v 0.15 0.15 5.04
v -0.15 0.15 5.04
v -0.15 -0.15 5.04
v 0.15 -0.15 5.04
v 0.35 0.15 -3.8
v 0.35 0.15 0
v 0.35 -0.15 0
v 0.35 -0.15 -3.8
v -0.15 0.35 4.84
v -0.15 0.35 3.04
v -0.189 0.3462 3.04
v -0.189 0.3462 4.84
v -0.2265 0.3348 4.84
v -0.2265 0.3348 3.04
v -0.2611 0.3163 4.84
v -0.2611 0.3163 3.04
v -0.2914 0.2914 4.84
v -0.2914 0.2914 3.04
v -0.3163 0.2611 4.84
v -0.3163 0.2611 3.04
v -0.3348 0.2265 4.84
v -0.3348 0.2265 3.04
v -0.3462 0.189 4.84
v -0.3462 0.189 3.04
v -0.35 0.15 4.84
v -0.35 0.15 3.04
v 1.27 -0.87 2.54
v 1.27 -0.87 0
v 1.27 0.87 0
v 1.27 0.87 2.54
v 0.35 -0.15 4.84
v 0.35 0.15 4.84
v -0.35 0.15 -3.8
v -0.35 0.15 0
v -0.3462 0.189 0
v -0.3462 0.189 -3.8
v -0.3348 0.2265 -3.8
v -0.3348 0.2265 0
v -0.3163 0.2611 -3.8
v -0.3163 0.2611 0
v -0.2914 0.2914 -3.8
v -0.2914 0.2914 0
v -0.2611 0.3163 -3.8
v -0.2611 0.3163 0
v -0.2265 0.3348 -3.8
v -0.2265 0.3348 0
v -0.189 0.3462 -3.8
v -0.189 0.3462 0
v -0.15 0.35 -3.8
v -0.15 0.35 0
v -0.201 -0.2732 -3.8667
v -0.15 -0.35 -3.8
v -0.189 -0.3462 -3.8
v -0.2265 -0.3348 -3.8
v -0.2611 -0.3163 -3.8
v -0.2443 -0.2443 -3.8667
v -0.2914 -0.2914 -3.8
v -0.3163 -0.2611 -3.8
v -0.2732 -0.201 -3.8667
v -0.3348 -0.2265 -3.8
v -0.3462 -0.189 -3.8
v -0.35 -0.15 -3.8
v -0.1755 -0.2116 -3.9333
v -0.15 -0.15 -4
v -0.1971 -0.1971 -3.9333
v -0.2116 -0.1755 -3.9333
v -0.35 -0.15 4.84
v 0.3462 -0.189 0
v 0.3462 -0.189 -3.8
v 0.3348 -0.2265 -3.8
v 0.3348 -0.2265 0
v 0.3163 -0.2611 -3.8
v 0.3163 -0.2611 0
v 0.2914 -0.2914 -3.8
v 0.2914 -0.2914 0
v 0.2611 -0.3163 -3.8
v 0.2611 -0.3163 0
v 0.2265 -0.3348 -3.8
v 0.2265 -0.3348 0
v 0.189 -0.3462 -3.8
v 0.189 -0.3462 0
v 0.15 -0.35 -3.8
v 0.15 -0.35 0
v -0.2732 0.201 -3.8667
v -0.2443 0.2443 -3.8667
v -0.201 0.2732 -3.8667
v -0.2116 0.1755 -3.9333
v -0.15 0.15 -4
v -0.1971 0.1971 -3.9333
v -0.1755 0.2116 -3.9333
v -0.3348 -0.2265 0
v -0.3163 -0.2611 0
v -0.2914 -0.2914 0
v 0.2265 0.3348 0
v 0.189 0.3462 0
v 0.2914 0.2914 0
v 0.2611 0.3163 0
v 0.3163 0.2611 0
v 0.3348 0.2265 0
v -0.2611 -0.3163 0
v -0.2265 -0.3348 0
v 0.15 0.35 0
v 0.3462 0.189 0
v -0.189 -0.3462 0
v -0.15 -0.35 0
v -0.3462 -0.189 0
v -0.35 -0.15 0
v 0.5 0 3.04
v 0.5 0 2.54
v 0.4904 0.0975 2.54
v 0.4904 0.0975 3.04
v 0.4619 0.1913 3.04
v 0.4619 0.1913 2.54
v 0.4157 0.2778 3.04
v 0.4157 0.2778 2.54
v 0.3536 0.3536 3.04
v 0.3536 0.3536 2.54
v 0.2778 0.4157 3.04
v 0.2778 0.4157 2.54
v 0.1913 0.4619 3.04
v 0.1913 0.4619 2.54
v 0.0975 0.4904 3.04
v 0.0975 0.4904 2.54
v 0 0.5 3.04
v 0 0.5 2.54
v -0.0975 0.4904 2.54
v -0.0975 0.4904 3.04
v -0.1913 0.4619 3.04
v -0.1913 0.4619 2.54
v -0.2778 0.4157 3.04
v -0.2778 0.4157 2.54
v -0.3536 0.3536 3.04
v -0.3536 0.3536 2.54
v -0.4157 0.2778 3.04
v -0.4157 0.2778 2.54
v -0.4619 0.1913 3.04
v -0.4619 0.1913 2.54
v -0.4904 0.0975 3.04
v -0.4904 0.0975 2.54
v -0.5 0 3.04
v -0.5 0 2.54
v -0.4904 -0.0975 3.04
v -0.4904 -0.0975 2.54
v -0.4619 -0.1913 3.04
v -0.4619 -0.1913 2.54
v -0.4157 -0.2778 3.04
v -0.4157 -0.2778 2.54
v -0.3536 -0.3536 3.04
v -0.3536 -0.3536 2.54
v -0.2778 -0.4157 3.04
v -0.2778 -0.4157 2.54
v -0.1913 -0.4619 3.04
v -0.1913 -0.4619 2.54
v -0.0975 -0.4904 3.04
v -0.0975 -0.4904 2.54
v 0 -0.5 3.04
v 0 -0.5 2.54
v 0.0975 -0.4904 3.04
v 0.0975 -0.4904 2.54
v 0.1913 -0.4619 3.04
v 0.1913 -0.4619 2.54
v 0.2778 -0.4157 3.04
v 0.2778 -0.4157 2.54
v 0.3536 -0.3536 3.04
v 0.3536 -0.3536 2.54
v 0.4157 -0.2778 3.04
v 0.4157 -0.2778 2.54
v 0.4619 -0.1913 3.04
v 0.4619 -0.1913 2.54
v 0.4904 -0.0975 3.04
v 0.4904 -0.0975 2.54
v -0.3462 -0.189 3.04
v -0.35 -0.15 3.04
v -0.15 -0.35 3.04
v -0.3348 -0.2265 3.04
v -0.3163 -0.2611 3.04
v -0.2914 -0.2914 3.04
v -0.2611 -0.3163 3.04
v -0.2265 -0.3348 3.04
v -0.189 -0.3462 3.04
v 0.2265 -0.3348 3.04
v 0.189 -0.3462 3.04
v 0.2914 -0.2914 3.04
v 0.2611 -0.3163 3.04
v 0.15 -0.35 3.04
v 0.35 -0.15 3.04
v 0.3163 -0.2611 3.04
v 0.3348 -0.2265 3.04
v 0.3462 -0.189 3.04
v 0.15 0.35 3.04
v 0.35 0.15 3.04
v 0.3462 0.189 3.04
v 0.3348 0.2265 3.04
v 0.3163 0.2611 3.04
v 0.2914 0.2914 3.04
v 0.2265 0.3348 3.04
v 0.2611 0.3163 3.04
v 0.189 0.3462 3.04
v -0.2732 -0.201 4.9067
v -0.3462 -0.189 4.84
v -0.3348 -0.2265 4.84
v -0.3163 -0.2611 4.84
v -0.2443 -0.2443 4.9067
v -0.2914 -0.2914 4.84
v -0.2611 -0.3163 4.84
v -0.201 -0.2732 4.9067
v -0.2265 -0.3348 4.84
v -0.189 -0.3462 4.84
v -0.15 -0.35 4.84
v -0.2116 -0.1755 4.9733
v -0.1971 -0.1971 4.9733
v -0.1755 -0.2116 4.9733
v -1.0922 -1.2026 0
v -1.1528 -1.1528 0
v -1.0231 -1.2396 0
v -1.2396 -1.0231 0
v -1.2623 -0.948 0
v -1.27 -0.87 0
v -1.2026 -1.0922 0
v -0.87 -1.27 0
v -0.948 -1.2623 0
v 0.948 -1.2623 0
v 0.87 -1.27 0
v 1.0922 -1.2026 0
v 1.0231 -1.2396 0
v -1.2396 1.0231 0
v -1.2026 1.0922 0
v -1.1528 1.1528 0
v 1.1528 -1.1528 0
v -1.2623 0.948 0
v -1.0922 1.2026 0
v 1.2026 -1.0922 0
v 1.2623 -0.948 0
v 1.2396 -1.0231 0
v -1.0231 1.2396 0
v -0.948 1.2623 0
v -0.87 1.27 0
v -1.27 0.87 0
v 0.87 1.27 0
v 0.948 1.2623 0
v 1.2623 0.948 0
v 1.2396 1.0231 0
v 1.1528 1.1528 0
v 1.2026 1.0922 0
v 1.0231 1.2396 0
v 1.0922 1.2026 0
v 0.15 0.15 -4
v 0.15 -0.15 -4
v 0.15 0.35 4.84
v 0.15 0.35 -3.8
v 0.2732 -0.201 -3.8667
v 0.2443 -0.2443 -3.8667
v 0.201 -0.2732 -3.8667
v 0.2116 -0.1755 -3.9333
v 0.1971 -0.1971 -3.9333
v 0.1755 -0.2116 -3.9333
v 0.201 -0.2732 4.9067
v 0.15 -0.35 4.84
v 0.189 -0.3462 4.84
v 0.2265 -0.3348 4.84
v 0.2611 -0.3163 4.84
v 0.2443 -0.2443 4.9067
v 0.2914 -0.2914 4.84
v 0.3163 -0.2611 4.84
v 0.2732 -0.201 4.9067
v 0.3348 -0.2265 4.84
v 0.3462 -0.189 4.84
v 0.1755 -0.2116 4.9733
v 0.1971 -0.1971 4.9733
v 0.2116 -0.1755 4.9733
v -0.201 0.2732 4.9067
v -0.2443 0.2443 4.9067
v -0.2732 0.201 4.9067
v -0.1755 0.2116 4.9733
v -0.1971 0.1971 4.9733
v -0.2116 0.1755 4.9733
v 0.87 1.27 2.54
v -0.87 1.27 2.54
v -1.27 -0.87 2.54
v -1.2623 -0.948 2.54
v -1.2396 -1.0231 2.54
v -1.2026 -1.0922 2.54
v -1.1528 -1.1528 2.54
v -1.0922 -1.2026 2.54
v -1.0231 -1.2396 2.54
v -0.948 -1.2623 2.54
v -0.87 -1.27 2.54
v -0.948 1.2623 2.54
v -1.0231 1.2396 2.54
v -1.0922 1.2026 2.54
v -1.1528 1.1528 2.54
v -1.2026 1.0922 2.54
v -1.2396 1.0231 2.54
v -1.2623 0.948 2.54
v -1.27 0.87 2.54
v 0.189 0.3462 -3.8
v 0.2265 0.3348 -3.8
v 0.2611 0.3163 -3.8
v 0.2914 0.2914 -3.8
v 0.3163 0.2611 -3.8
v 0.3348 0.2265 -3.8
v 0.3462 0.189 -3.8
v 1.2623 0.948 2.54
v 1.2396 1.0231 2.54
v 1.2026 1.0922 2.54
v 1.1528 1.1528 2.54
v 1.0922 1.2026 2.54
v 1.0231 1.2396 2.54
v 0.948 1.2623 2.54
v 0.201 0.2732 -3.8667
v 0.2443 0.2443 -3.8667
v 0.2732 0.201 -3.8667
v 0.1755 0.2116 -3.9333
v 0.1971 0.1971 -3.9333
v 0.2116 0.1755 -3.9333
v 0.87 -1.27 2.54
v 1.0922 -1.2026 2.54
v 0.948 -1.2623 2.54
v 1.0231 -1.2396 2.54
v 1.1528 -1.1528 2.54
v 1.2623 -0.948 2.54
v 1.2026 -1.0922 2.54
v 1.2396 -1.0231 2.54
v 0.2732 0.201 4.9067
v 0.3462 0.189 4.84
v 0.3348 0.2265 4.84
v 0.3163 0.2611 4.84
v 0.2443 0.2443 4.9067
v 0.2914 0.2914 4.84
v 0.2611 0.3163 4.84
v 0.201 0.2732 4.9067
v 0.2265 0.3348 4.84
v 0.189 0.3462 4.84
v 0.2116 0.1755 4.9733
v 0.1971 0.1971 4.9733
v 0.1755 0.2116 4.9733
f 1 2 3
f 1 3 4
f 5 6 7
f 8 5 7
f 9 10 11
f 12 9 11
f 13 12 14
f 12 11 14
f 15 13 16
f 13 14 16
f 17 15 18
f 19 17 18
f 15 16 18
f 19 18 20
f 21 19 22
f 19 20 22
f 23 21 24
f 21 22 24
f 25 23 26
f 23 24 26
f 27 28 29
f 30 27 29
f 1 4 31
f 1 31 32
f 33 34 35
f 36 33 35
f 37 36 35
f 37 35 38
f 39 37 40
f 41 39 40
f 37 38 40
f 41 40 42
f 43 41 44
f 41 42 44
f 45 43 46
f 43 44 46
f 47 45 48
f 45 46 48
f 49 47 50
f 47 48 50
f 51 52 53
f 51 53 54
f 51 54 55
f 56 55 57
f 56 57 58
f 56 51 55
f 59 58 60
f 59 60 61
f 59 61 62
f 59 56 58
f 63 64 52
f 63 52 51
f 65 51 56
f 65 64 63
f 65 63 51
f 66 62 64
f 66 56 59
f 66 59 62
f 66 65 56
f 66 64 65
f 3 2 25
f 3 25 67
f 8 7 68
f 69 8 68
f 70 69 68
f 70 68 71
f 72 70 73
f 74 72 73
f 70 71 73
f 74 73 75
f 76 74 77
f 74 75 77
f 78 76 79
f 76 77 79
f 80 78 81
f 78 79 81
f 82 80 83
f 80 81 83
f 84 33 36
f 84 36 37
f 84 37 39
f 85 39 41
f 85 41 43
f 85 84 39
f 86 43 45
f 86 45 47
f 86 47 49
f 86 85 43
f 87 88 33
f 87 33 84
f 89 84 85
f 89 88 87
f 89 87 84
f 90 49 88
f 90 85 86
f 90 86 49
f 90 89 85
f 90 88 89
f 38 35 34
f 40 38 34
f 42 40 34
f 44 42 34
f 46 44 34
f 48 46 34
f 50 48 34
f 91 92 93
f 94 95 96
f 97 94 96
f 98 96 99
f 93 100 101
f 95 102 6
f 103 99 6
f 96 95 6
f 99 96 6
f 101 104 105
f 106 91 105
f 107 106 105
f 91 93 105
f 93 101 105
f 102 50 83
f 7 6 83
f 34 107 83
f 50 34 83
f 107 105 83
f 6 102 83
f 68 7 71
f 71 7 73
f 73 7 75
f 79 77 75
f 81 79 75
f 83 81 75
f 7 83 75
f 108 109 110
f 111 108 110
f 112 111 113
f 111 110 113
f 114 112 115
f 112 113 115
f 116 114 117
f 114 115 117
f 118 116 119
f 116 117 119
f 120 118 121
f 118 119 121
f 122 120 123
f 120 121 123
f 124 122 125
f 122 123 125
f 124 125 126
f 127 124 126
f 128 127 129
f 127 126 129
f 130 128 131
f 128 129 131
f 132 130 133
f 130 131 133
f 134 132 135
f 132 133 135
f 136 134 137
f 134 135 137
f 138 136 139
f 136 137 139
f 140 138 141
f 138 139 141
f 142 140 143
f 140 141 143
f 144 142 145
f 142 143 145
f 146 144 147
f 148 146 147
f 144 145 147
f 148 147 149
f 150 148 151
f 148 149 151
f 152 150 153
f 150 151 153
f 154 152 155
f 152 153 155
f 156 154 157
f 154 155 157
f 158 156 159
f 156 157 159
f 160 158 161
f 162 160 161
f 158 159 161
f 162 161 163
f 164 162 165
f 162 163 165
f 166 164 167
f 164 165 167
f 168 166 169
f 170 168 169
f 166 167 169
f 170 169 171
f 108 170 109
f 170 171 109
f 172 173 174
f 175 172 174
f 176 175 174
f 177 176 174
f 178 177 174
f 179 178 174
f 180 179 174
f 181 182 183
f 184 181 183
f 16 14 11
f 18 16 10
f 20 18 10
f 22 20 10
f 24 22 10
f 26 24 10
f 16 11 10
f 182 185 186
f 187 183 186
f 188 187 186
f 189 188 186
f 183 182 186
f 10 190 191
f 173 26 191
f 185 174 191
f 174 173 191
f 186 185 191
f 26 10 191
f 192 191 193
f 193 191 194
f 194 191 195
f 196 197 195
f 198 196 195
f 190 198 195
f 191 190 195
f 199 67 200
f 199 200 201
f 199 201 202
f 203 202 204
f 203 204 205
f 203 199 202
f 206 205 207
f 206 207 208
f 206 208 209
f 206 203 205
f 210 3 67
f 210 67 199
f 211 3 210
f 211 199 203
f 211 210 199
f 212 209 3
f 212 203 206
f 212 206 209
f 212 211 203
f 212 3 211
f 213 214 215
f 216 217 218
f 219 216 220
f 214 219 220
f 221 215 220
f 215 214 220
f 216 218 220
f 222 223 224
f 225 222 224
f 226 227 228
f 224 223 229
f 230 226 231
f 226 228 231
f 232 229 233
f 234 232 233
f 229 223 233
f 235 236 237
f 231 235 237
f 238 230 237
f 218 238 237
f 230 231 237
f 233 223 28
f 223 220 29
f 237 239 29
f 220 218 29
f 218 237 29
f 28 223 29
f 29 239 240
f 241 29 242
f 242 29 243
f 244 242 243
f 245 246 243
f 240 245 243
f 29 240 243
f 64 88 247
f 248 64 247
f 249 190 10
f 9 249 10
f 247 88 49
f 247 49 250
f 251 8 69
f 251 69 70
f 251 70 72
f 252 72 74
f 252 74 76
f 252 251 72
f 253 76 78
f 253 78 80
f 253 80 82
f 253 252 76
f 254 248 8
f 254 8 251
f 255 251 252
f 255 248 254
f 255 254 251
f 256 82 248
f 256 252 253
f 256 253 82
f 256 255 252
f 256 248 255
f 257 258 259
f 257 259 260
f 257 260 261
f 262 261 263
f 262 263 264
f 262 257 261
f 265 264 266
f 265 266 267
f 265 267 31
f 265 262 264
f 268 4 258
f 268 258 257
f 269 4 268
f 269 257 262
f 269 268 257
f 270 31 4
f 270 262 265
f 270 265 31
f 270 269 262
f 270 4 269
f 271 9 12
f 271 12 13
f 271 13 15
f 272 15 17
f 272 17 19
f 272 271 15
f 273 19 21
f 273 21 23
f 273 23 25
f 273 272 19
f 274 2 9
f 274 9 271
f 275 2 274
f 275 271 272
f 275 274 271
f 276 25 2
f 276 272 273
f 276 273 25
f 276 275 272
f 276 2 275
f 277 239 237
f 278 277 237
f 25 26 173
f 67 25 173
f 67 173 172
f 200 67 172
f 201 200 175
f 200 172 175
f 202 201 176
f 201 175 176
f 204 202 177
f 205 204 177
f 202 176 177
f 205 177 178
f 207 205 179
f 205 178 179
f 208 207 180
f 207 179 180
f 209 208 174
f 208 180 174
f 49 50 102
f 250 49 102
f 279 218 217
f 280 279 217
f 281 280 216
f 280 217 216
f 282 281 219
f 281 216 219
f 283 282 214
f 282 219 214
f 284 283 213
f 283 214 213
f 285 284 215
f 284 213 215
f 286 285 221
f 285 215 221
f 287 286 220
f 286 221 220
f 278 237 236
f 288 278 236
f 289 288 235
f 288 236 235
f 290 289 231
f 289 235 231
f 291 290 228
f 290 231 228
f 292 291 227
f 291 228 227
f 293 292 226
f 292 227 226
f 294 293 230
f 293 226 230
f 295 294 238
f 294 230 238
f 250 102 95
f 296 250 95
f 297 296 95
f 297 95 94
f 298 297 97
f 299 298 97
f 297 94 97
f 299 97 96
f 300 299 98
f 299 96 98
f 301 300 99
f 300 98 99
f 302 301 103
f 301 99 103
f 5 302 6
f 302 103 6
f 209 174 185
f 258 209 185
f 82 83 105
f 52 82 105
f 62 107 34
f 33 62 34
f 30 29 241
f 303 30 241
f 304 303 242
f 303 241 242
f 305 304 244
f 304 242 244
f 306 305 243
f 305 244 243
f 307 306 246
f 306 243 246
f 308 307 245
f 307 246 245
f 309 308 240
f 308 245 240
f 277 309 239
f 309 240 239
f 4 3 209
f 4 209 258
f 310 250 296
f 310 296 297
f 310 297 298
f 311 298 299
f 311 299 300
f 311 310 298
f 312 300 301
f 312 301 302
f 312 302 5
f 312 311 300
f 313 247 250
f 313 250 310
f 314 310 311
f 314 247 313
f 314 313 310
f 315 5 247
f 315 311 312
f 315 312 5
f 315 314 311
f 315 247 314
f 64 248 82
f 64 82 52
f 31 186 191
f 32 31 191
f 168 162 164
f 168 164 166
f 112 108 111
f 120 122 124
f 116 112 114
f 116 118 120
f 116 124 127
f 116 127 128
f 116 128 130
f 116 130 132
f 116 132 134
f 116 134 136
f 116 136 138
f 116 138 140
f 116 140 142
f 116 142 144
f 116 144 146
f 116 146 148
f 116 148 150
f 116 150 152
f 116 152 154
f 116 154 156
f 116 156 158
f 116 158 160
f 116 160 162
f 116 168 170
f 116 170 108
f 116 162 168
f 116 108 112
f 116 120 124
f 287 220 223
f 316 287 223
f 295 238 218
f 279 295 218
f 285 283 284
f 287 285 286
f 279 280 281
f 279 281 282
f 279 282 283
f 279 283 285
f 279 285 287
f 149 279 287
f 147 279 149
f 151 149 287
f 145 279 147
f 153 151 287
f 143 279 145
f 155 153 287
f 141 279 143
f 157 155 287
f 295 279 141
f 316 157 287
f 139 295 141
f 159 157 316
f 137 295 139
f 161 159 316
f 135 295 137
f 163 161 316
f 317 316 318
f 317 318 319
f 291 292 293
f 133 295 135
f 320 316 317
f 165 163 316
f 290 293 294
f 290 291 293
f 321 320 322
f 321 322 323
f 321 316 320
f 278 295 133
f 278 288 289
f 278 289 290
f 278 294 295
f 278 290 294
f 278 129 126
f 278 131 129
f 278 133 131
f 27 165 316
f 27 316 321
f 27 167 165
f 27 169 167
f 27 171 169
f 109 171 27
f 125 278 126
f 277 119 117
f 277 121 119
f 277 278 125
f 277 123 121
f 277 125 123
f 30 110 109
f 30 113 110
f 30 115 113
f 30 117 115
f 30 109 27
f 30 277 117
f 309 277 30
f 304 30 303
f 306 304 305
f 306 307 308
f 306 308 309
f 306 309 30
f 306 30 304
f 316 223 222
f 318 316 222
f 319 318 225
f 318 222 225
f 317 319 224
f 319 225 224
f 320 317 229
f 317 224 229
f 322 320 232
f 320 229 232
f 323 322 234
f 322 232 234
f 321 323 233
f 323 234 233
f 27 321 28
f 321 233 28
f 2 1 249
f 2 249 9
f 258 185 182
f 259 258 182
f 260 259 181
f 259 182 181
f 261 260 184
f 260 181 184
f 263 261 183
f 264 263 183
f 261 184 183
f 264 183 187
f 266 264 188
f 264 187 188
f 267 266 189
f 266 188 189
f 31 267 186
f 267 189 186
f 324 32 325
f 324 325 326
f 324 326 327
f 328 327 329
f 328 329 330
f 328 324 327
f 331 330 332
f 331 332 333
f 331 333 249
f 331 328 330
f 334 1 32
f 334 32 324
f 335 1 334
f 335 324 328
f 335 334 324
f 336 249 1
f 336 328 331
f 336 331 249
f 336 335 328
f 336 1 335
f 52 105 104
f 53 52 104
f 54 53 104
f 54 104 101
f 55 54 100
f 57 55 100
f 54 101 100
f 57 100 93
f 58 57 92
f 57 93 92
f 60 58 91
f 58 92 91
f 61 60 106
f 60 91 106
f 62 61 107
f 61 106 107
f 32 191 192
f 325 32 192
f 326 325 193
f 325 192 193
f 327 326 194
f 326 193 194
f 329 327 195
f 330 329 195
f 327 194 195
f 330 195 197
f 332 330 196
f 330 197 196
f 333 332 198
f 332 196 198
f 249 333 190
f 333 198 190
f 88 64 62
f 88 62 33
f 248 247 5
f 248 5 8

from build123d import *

# Parameters (mm, degrees)
F1_DEPTH = 2.54
F2_R     = 0.5
F3_DEPTH = 0.5
F5_DEPTH = 2
F6_SIZE  = 0.2
F8_DEPTH = 4
F9_SIZE  = 0.19999


# Not quite as in the source:
# - a fillet or chamfer is up to 0.001 mm smaller than in the source, because OpenCascade refuses the exact size


with BuildPart() as f1:
    # F0 (on Top) → F1 (new body)
    with BuildSketch(Plane.XY):
        with BuildLine():
            Line((-0.87, -1.27), (0.87, -1.27))
            ThreePointArc((0.87, -1.27), (1.1528427125, -1.1528427125), (1.27, -0.87))
            Line((1.27, -0.87), (1.27, 0.87))
            ThreePointArc((1.27, 0.87), (1.1528427125, 1.1528427125), (0.87, 1.27))
            Line((0.87, 1.27), (-0.87, 1.27))
            ThreePointArc((-0.87, 1.27), (-1.1528427125, 1.1528427125), (-1.27, 0.87))
            Line((-1.27, 0.87), (-1.27, -0.87))
            ThreePointArc((-1.27, -0.87), (-1.1528427125, -1.1528427125), (-0.87, -1.27))
        make_face()
    extrude(amount=F1_DEPTH)

    # F2 (on face) → F3 (join)
    with BuildSketch(Plane.XY.offset(2.54)):
        Circle(F2_R)
    extrude(amount=F3_DEPTH)


with BuildPart() as f5:
    # F4 (on face) → F5 (new body)
    with BuildSketch(Plane.XY.offset(3.04)):
        with BuildLine():
            Line((0.15, 0.35), (-0.15, 0.35))
            ThreePointArc((-0.15, 0.35), (-0.2914213562, 0.2914213562), (-0.35, 0.15))
            Line((-0.35, 0.15), (-0.35, -0.15))
            ThreePointArc((-0.35, -0.15), (-0.2914213562, -0.2914213562), (-0.15, -0.35))
            Line((-0.15, -0.35), (0.15, -0.35))
            ThreePointArc((0.15, -0.35), (0.2914213562, -0.2914213562), (0.35, -0.15))
            Line((0.35, -0.15), (0.35, 0.15))
            ThreePointArc((0.35, 0.15), (0.2914213562, 0.2914213562), (0.15, 0.35))
        make_face()
    extrude(amount=F5_DEPTH)

    # F6
    f6_edges = [f5.edges().sort_by_distance(p)[0] for p in [
        (0.35, 0, 5.04),
        (0.291421, 0.291421, 5.04),
        (0, 0.35, 5.04),
        (-0.291421, 0.291421, 5.04),
        (-0.35, 0, 5.04),
        (-0.291421, -0.291421, 5.04),
        (0, -0.35, 5.04),
        (0.291421, -0.291421, 5.04),
    ]]
    chamfer(f6_edges, length=F6_SIZE)


with BuildPart() as f8:
    # F7 (on face) → F8 (new body)
    with BuildSketch(Plane(origin=(0, 0, 0), x_dir=(1, 0, 0), z_dir=(0, 0, -1))):
        with BuildLine():
            ThreePointArc((-0.35, -0.15), (-0.2914213562, -0.2914213562), (-0.15, -0.35))
            Line((-0.15, -0.35), (0.15, -0.35))
            ThreePointArc((0.15, -0.35), (0.2914213562, -0.2914213562), (0.35, -0.15))
            Line((0.35, -0.15), (0.35, 0.15))
            ThreePointArc((0.35, 0.15), (0.2914213562, 0.2914213562), (0.15, 0.35))
            Line((0.15, 0.35), (-0.15, 0.35))
            ThreePointArc((-0.15, 0.35), (-0.2914213562, 0.2914213562), (-0.35, 0.15))
            Line((-0.35, 0.15), (-0.35, -0.15))
        make_face()
    extrude(amount=F8_DEPTH)

    # F9 (size 0.2 in the source; OpenCascade refuses exactly that, so slightly less here)
    f9_edges = [f8.edges().sort_by_distance(p)[0] for p in [
        (-0.291421, 0.291421, -4),
        (0, 0.35, -4),
        (0.291421, 0.291421, -4),
        (0.35, 0, -4),
        (0.291421, -0.291421, -4),
        (0, -0.35, -4),
        (-0.291421, -0.291421, -4),
        (-0.35, 0, -4),
    ]]
    chamfer(f9_edges, length=F9_SIZE)


solid = Compound([f1.part, f5.part, f8.part])
